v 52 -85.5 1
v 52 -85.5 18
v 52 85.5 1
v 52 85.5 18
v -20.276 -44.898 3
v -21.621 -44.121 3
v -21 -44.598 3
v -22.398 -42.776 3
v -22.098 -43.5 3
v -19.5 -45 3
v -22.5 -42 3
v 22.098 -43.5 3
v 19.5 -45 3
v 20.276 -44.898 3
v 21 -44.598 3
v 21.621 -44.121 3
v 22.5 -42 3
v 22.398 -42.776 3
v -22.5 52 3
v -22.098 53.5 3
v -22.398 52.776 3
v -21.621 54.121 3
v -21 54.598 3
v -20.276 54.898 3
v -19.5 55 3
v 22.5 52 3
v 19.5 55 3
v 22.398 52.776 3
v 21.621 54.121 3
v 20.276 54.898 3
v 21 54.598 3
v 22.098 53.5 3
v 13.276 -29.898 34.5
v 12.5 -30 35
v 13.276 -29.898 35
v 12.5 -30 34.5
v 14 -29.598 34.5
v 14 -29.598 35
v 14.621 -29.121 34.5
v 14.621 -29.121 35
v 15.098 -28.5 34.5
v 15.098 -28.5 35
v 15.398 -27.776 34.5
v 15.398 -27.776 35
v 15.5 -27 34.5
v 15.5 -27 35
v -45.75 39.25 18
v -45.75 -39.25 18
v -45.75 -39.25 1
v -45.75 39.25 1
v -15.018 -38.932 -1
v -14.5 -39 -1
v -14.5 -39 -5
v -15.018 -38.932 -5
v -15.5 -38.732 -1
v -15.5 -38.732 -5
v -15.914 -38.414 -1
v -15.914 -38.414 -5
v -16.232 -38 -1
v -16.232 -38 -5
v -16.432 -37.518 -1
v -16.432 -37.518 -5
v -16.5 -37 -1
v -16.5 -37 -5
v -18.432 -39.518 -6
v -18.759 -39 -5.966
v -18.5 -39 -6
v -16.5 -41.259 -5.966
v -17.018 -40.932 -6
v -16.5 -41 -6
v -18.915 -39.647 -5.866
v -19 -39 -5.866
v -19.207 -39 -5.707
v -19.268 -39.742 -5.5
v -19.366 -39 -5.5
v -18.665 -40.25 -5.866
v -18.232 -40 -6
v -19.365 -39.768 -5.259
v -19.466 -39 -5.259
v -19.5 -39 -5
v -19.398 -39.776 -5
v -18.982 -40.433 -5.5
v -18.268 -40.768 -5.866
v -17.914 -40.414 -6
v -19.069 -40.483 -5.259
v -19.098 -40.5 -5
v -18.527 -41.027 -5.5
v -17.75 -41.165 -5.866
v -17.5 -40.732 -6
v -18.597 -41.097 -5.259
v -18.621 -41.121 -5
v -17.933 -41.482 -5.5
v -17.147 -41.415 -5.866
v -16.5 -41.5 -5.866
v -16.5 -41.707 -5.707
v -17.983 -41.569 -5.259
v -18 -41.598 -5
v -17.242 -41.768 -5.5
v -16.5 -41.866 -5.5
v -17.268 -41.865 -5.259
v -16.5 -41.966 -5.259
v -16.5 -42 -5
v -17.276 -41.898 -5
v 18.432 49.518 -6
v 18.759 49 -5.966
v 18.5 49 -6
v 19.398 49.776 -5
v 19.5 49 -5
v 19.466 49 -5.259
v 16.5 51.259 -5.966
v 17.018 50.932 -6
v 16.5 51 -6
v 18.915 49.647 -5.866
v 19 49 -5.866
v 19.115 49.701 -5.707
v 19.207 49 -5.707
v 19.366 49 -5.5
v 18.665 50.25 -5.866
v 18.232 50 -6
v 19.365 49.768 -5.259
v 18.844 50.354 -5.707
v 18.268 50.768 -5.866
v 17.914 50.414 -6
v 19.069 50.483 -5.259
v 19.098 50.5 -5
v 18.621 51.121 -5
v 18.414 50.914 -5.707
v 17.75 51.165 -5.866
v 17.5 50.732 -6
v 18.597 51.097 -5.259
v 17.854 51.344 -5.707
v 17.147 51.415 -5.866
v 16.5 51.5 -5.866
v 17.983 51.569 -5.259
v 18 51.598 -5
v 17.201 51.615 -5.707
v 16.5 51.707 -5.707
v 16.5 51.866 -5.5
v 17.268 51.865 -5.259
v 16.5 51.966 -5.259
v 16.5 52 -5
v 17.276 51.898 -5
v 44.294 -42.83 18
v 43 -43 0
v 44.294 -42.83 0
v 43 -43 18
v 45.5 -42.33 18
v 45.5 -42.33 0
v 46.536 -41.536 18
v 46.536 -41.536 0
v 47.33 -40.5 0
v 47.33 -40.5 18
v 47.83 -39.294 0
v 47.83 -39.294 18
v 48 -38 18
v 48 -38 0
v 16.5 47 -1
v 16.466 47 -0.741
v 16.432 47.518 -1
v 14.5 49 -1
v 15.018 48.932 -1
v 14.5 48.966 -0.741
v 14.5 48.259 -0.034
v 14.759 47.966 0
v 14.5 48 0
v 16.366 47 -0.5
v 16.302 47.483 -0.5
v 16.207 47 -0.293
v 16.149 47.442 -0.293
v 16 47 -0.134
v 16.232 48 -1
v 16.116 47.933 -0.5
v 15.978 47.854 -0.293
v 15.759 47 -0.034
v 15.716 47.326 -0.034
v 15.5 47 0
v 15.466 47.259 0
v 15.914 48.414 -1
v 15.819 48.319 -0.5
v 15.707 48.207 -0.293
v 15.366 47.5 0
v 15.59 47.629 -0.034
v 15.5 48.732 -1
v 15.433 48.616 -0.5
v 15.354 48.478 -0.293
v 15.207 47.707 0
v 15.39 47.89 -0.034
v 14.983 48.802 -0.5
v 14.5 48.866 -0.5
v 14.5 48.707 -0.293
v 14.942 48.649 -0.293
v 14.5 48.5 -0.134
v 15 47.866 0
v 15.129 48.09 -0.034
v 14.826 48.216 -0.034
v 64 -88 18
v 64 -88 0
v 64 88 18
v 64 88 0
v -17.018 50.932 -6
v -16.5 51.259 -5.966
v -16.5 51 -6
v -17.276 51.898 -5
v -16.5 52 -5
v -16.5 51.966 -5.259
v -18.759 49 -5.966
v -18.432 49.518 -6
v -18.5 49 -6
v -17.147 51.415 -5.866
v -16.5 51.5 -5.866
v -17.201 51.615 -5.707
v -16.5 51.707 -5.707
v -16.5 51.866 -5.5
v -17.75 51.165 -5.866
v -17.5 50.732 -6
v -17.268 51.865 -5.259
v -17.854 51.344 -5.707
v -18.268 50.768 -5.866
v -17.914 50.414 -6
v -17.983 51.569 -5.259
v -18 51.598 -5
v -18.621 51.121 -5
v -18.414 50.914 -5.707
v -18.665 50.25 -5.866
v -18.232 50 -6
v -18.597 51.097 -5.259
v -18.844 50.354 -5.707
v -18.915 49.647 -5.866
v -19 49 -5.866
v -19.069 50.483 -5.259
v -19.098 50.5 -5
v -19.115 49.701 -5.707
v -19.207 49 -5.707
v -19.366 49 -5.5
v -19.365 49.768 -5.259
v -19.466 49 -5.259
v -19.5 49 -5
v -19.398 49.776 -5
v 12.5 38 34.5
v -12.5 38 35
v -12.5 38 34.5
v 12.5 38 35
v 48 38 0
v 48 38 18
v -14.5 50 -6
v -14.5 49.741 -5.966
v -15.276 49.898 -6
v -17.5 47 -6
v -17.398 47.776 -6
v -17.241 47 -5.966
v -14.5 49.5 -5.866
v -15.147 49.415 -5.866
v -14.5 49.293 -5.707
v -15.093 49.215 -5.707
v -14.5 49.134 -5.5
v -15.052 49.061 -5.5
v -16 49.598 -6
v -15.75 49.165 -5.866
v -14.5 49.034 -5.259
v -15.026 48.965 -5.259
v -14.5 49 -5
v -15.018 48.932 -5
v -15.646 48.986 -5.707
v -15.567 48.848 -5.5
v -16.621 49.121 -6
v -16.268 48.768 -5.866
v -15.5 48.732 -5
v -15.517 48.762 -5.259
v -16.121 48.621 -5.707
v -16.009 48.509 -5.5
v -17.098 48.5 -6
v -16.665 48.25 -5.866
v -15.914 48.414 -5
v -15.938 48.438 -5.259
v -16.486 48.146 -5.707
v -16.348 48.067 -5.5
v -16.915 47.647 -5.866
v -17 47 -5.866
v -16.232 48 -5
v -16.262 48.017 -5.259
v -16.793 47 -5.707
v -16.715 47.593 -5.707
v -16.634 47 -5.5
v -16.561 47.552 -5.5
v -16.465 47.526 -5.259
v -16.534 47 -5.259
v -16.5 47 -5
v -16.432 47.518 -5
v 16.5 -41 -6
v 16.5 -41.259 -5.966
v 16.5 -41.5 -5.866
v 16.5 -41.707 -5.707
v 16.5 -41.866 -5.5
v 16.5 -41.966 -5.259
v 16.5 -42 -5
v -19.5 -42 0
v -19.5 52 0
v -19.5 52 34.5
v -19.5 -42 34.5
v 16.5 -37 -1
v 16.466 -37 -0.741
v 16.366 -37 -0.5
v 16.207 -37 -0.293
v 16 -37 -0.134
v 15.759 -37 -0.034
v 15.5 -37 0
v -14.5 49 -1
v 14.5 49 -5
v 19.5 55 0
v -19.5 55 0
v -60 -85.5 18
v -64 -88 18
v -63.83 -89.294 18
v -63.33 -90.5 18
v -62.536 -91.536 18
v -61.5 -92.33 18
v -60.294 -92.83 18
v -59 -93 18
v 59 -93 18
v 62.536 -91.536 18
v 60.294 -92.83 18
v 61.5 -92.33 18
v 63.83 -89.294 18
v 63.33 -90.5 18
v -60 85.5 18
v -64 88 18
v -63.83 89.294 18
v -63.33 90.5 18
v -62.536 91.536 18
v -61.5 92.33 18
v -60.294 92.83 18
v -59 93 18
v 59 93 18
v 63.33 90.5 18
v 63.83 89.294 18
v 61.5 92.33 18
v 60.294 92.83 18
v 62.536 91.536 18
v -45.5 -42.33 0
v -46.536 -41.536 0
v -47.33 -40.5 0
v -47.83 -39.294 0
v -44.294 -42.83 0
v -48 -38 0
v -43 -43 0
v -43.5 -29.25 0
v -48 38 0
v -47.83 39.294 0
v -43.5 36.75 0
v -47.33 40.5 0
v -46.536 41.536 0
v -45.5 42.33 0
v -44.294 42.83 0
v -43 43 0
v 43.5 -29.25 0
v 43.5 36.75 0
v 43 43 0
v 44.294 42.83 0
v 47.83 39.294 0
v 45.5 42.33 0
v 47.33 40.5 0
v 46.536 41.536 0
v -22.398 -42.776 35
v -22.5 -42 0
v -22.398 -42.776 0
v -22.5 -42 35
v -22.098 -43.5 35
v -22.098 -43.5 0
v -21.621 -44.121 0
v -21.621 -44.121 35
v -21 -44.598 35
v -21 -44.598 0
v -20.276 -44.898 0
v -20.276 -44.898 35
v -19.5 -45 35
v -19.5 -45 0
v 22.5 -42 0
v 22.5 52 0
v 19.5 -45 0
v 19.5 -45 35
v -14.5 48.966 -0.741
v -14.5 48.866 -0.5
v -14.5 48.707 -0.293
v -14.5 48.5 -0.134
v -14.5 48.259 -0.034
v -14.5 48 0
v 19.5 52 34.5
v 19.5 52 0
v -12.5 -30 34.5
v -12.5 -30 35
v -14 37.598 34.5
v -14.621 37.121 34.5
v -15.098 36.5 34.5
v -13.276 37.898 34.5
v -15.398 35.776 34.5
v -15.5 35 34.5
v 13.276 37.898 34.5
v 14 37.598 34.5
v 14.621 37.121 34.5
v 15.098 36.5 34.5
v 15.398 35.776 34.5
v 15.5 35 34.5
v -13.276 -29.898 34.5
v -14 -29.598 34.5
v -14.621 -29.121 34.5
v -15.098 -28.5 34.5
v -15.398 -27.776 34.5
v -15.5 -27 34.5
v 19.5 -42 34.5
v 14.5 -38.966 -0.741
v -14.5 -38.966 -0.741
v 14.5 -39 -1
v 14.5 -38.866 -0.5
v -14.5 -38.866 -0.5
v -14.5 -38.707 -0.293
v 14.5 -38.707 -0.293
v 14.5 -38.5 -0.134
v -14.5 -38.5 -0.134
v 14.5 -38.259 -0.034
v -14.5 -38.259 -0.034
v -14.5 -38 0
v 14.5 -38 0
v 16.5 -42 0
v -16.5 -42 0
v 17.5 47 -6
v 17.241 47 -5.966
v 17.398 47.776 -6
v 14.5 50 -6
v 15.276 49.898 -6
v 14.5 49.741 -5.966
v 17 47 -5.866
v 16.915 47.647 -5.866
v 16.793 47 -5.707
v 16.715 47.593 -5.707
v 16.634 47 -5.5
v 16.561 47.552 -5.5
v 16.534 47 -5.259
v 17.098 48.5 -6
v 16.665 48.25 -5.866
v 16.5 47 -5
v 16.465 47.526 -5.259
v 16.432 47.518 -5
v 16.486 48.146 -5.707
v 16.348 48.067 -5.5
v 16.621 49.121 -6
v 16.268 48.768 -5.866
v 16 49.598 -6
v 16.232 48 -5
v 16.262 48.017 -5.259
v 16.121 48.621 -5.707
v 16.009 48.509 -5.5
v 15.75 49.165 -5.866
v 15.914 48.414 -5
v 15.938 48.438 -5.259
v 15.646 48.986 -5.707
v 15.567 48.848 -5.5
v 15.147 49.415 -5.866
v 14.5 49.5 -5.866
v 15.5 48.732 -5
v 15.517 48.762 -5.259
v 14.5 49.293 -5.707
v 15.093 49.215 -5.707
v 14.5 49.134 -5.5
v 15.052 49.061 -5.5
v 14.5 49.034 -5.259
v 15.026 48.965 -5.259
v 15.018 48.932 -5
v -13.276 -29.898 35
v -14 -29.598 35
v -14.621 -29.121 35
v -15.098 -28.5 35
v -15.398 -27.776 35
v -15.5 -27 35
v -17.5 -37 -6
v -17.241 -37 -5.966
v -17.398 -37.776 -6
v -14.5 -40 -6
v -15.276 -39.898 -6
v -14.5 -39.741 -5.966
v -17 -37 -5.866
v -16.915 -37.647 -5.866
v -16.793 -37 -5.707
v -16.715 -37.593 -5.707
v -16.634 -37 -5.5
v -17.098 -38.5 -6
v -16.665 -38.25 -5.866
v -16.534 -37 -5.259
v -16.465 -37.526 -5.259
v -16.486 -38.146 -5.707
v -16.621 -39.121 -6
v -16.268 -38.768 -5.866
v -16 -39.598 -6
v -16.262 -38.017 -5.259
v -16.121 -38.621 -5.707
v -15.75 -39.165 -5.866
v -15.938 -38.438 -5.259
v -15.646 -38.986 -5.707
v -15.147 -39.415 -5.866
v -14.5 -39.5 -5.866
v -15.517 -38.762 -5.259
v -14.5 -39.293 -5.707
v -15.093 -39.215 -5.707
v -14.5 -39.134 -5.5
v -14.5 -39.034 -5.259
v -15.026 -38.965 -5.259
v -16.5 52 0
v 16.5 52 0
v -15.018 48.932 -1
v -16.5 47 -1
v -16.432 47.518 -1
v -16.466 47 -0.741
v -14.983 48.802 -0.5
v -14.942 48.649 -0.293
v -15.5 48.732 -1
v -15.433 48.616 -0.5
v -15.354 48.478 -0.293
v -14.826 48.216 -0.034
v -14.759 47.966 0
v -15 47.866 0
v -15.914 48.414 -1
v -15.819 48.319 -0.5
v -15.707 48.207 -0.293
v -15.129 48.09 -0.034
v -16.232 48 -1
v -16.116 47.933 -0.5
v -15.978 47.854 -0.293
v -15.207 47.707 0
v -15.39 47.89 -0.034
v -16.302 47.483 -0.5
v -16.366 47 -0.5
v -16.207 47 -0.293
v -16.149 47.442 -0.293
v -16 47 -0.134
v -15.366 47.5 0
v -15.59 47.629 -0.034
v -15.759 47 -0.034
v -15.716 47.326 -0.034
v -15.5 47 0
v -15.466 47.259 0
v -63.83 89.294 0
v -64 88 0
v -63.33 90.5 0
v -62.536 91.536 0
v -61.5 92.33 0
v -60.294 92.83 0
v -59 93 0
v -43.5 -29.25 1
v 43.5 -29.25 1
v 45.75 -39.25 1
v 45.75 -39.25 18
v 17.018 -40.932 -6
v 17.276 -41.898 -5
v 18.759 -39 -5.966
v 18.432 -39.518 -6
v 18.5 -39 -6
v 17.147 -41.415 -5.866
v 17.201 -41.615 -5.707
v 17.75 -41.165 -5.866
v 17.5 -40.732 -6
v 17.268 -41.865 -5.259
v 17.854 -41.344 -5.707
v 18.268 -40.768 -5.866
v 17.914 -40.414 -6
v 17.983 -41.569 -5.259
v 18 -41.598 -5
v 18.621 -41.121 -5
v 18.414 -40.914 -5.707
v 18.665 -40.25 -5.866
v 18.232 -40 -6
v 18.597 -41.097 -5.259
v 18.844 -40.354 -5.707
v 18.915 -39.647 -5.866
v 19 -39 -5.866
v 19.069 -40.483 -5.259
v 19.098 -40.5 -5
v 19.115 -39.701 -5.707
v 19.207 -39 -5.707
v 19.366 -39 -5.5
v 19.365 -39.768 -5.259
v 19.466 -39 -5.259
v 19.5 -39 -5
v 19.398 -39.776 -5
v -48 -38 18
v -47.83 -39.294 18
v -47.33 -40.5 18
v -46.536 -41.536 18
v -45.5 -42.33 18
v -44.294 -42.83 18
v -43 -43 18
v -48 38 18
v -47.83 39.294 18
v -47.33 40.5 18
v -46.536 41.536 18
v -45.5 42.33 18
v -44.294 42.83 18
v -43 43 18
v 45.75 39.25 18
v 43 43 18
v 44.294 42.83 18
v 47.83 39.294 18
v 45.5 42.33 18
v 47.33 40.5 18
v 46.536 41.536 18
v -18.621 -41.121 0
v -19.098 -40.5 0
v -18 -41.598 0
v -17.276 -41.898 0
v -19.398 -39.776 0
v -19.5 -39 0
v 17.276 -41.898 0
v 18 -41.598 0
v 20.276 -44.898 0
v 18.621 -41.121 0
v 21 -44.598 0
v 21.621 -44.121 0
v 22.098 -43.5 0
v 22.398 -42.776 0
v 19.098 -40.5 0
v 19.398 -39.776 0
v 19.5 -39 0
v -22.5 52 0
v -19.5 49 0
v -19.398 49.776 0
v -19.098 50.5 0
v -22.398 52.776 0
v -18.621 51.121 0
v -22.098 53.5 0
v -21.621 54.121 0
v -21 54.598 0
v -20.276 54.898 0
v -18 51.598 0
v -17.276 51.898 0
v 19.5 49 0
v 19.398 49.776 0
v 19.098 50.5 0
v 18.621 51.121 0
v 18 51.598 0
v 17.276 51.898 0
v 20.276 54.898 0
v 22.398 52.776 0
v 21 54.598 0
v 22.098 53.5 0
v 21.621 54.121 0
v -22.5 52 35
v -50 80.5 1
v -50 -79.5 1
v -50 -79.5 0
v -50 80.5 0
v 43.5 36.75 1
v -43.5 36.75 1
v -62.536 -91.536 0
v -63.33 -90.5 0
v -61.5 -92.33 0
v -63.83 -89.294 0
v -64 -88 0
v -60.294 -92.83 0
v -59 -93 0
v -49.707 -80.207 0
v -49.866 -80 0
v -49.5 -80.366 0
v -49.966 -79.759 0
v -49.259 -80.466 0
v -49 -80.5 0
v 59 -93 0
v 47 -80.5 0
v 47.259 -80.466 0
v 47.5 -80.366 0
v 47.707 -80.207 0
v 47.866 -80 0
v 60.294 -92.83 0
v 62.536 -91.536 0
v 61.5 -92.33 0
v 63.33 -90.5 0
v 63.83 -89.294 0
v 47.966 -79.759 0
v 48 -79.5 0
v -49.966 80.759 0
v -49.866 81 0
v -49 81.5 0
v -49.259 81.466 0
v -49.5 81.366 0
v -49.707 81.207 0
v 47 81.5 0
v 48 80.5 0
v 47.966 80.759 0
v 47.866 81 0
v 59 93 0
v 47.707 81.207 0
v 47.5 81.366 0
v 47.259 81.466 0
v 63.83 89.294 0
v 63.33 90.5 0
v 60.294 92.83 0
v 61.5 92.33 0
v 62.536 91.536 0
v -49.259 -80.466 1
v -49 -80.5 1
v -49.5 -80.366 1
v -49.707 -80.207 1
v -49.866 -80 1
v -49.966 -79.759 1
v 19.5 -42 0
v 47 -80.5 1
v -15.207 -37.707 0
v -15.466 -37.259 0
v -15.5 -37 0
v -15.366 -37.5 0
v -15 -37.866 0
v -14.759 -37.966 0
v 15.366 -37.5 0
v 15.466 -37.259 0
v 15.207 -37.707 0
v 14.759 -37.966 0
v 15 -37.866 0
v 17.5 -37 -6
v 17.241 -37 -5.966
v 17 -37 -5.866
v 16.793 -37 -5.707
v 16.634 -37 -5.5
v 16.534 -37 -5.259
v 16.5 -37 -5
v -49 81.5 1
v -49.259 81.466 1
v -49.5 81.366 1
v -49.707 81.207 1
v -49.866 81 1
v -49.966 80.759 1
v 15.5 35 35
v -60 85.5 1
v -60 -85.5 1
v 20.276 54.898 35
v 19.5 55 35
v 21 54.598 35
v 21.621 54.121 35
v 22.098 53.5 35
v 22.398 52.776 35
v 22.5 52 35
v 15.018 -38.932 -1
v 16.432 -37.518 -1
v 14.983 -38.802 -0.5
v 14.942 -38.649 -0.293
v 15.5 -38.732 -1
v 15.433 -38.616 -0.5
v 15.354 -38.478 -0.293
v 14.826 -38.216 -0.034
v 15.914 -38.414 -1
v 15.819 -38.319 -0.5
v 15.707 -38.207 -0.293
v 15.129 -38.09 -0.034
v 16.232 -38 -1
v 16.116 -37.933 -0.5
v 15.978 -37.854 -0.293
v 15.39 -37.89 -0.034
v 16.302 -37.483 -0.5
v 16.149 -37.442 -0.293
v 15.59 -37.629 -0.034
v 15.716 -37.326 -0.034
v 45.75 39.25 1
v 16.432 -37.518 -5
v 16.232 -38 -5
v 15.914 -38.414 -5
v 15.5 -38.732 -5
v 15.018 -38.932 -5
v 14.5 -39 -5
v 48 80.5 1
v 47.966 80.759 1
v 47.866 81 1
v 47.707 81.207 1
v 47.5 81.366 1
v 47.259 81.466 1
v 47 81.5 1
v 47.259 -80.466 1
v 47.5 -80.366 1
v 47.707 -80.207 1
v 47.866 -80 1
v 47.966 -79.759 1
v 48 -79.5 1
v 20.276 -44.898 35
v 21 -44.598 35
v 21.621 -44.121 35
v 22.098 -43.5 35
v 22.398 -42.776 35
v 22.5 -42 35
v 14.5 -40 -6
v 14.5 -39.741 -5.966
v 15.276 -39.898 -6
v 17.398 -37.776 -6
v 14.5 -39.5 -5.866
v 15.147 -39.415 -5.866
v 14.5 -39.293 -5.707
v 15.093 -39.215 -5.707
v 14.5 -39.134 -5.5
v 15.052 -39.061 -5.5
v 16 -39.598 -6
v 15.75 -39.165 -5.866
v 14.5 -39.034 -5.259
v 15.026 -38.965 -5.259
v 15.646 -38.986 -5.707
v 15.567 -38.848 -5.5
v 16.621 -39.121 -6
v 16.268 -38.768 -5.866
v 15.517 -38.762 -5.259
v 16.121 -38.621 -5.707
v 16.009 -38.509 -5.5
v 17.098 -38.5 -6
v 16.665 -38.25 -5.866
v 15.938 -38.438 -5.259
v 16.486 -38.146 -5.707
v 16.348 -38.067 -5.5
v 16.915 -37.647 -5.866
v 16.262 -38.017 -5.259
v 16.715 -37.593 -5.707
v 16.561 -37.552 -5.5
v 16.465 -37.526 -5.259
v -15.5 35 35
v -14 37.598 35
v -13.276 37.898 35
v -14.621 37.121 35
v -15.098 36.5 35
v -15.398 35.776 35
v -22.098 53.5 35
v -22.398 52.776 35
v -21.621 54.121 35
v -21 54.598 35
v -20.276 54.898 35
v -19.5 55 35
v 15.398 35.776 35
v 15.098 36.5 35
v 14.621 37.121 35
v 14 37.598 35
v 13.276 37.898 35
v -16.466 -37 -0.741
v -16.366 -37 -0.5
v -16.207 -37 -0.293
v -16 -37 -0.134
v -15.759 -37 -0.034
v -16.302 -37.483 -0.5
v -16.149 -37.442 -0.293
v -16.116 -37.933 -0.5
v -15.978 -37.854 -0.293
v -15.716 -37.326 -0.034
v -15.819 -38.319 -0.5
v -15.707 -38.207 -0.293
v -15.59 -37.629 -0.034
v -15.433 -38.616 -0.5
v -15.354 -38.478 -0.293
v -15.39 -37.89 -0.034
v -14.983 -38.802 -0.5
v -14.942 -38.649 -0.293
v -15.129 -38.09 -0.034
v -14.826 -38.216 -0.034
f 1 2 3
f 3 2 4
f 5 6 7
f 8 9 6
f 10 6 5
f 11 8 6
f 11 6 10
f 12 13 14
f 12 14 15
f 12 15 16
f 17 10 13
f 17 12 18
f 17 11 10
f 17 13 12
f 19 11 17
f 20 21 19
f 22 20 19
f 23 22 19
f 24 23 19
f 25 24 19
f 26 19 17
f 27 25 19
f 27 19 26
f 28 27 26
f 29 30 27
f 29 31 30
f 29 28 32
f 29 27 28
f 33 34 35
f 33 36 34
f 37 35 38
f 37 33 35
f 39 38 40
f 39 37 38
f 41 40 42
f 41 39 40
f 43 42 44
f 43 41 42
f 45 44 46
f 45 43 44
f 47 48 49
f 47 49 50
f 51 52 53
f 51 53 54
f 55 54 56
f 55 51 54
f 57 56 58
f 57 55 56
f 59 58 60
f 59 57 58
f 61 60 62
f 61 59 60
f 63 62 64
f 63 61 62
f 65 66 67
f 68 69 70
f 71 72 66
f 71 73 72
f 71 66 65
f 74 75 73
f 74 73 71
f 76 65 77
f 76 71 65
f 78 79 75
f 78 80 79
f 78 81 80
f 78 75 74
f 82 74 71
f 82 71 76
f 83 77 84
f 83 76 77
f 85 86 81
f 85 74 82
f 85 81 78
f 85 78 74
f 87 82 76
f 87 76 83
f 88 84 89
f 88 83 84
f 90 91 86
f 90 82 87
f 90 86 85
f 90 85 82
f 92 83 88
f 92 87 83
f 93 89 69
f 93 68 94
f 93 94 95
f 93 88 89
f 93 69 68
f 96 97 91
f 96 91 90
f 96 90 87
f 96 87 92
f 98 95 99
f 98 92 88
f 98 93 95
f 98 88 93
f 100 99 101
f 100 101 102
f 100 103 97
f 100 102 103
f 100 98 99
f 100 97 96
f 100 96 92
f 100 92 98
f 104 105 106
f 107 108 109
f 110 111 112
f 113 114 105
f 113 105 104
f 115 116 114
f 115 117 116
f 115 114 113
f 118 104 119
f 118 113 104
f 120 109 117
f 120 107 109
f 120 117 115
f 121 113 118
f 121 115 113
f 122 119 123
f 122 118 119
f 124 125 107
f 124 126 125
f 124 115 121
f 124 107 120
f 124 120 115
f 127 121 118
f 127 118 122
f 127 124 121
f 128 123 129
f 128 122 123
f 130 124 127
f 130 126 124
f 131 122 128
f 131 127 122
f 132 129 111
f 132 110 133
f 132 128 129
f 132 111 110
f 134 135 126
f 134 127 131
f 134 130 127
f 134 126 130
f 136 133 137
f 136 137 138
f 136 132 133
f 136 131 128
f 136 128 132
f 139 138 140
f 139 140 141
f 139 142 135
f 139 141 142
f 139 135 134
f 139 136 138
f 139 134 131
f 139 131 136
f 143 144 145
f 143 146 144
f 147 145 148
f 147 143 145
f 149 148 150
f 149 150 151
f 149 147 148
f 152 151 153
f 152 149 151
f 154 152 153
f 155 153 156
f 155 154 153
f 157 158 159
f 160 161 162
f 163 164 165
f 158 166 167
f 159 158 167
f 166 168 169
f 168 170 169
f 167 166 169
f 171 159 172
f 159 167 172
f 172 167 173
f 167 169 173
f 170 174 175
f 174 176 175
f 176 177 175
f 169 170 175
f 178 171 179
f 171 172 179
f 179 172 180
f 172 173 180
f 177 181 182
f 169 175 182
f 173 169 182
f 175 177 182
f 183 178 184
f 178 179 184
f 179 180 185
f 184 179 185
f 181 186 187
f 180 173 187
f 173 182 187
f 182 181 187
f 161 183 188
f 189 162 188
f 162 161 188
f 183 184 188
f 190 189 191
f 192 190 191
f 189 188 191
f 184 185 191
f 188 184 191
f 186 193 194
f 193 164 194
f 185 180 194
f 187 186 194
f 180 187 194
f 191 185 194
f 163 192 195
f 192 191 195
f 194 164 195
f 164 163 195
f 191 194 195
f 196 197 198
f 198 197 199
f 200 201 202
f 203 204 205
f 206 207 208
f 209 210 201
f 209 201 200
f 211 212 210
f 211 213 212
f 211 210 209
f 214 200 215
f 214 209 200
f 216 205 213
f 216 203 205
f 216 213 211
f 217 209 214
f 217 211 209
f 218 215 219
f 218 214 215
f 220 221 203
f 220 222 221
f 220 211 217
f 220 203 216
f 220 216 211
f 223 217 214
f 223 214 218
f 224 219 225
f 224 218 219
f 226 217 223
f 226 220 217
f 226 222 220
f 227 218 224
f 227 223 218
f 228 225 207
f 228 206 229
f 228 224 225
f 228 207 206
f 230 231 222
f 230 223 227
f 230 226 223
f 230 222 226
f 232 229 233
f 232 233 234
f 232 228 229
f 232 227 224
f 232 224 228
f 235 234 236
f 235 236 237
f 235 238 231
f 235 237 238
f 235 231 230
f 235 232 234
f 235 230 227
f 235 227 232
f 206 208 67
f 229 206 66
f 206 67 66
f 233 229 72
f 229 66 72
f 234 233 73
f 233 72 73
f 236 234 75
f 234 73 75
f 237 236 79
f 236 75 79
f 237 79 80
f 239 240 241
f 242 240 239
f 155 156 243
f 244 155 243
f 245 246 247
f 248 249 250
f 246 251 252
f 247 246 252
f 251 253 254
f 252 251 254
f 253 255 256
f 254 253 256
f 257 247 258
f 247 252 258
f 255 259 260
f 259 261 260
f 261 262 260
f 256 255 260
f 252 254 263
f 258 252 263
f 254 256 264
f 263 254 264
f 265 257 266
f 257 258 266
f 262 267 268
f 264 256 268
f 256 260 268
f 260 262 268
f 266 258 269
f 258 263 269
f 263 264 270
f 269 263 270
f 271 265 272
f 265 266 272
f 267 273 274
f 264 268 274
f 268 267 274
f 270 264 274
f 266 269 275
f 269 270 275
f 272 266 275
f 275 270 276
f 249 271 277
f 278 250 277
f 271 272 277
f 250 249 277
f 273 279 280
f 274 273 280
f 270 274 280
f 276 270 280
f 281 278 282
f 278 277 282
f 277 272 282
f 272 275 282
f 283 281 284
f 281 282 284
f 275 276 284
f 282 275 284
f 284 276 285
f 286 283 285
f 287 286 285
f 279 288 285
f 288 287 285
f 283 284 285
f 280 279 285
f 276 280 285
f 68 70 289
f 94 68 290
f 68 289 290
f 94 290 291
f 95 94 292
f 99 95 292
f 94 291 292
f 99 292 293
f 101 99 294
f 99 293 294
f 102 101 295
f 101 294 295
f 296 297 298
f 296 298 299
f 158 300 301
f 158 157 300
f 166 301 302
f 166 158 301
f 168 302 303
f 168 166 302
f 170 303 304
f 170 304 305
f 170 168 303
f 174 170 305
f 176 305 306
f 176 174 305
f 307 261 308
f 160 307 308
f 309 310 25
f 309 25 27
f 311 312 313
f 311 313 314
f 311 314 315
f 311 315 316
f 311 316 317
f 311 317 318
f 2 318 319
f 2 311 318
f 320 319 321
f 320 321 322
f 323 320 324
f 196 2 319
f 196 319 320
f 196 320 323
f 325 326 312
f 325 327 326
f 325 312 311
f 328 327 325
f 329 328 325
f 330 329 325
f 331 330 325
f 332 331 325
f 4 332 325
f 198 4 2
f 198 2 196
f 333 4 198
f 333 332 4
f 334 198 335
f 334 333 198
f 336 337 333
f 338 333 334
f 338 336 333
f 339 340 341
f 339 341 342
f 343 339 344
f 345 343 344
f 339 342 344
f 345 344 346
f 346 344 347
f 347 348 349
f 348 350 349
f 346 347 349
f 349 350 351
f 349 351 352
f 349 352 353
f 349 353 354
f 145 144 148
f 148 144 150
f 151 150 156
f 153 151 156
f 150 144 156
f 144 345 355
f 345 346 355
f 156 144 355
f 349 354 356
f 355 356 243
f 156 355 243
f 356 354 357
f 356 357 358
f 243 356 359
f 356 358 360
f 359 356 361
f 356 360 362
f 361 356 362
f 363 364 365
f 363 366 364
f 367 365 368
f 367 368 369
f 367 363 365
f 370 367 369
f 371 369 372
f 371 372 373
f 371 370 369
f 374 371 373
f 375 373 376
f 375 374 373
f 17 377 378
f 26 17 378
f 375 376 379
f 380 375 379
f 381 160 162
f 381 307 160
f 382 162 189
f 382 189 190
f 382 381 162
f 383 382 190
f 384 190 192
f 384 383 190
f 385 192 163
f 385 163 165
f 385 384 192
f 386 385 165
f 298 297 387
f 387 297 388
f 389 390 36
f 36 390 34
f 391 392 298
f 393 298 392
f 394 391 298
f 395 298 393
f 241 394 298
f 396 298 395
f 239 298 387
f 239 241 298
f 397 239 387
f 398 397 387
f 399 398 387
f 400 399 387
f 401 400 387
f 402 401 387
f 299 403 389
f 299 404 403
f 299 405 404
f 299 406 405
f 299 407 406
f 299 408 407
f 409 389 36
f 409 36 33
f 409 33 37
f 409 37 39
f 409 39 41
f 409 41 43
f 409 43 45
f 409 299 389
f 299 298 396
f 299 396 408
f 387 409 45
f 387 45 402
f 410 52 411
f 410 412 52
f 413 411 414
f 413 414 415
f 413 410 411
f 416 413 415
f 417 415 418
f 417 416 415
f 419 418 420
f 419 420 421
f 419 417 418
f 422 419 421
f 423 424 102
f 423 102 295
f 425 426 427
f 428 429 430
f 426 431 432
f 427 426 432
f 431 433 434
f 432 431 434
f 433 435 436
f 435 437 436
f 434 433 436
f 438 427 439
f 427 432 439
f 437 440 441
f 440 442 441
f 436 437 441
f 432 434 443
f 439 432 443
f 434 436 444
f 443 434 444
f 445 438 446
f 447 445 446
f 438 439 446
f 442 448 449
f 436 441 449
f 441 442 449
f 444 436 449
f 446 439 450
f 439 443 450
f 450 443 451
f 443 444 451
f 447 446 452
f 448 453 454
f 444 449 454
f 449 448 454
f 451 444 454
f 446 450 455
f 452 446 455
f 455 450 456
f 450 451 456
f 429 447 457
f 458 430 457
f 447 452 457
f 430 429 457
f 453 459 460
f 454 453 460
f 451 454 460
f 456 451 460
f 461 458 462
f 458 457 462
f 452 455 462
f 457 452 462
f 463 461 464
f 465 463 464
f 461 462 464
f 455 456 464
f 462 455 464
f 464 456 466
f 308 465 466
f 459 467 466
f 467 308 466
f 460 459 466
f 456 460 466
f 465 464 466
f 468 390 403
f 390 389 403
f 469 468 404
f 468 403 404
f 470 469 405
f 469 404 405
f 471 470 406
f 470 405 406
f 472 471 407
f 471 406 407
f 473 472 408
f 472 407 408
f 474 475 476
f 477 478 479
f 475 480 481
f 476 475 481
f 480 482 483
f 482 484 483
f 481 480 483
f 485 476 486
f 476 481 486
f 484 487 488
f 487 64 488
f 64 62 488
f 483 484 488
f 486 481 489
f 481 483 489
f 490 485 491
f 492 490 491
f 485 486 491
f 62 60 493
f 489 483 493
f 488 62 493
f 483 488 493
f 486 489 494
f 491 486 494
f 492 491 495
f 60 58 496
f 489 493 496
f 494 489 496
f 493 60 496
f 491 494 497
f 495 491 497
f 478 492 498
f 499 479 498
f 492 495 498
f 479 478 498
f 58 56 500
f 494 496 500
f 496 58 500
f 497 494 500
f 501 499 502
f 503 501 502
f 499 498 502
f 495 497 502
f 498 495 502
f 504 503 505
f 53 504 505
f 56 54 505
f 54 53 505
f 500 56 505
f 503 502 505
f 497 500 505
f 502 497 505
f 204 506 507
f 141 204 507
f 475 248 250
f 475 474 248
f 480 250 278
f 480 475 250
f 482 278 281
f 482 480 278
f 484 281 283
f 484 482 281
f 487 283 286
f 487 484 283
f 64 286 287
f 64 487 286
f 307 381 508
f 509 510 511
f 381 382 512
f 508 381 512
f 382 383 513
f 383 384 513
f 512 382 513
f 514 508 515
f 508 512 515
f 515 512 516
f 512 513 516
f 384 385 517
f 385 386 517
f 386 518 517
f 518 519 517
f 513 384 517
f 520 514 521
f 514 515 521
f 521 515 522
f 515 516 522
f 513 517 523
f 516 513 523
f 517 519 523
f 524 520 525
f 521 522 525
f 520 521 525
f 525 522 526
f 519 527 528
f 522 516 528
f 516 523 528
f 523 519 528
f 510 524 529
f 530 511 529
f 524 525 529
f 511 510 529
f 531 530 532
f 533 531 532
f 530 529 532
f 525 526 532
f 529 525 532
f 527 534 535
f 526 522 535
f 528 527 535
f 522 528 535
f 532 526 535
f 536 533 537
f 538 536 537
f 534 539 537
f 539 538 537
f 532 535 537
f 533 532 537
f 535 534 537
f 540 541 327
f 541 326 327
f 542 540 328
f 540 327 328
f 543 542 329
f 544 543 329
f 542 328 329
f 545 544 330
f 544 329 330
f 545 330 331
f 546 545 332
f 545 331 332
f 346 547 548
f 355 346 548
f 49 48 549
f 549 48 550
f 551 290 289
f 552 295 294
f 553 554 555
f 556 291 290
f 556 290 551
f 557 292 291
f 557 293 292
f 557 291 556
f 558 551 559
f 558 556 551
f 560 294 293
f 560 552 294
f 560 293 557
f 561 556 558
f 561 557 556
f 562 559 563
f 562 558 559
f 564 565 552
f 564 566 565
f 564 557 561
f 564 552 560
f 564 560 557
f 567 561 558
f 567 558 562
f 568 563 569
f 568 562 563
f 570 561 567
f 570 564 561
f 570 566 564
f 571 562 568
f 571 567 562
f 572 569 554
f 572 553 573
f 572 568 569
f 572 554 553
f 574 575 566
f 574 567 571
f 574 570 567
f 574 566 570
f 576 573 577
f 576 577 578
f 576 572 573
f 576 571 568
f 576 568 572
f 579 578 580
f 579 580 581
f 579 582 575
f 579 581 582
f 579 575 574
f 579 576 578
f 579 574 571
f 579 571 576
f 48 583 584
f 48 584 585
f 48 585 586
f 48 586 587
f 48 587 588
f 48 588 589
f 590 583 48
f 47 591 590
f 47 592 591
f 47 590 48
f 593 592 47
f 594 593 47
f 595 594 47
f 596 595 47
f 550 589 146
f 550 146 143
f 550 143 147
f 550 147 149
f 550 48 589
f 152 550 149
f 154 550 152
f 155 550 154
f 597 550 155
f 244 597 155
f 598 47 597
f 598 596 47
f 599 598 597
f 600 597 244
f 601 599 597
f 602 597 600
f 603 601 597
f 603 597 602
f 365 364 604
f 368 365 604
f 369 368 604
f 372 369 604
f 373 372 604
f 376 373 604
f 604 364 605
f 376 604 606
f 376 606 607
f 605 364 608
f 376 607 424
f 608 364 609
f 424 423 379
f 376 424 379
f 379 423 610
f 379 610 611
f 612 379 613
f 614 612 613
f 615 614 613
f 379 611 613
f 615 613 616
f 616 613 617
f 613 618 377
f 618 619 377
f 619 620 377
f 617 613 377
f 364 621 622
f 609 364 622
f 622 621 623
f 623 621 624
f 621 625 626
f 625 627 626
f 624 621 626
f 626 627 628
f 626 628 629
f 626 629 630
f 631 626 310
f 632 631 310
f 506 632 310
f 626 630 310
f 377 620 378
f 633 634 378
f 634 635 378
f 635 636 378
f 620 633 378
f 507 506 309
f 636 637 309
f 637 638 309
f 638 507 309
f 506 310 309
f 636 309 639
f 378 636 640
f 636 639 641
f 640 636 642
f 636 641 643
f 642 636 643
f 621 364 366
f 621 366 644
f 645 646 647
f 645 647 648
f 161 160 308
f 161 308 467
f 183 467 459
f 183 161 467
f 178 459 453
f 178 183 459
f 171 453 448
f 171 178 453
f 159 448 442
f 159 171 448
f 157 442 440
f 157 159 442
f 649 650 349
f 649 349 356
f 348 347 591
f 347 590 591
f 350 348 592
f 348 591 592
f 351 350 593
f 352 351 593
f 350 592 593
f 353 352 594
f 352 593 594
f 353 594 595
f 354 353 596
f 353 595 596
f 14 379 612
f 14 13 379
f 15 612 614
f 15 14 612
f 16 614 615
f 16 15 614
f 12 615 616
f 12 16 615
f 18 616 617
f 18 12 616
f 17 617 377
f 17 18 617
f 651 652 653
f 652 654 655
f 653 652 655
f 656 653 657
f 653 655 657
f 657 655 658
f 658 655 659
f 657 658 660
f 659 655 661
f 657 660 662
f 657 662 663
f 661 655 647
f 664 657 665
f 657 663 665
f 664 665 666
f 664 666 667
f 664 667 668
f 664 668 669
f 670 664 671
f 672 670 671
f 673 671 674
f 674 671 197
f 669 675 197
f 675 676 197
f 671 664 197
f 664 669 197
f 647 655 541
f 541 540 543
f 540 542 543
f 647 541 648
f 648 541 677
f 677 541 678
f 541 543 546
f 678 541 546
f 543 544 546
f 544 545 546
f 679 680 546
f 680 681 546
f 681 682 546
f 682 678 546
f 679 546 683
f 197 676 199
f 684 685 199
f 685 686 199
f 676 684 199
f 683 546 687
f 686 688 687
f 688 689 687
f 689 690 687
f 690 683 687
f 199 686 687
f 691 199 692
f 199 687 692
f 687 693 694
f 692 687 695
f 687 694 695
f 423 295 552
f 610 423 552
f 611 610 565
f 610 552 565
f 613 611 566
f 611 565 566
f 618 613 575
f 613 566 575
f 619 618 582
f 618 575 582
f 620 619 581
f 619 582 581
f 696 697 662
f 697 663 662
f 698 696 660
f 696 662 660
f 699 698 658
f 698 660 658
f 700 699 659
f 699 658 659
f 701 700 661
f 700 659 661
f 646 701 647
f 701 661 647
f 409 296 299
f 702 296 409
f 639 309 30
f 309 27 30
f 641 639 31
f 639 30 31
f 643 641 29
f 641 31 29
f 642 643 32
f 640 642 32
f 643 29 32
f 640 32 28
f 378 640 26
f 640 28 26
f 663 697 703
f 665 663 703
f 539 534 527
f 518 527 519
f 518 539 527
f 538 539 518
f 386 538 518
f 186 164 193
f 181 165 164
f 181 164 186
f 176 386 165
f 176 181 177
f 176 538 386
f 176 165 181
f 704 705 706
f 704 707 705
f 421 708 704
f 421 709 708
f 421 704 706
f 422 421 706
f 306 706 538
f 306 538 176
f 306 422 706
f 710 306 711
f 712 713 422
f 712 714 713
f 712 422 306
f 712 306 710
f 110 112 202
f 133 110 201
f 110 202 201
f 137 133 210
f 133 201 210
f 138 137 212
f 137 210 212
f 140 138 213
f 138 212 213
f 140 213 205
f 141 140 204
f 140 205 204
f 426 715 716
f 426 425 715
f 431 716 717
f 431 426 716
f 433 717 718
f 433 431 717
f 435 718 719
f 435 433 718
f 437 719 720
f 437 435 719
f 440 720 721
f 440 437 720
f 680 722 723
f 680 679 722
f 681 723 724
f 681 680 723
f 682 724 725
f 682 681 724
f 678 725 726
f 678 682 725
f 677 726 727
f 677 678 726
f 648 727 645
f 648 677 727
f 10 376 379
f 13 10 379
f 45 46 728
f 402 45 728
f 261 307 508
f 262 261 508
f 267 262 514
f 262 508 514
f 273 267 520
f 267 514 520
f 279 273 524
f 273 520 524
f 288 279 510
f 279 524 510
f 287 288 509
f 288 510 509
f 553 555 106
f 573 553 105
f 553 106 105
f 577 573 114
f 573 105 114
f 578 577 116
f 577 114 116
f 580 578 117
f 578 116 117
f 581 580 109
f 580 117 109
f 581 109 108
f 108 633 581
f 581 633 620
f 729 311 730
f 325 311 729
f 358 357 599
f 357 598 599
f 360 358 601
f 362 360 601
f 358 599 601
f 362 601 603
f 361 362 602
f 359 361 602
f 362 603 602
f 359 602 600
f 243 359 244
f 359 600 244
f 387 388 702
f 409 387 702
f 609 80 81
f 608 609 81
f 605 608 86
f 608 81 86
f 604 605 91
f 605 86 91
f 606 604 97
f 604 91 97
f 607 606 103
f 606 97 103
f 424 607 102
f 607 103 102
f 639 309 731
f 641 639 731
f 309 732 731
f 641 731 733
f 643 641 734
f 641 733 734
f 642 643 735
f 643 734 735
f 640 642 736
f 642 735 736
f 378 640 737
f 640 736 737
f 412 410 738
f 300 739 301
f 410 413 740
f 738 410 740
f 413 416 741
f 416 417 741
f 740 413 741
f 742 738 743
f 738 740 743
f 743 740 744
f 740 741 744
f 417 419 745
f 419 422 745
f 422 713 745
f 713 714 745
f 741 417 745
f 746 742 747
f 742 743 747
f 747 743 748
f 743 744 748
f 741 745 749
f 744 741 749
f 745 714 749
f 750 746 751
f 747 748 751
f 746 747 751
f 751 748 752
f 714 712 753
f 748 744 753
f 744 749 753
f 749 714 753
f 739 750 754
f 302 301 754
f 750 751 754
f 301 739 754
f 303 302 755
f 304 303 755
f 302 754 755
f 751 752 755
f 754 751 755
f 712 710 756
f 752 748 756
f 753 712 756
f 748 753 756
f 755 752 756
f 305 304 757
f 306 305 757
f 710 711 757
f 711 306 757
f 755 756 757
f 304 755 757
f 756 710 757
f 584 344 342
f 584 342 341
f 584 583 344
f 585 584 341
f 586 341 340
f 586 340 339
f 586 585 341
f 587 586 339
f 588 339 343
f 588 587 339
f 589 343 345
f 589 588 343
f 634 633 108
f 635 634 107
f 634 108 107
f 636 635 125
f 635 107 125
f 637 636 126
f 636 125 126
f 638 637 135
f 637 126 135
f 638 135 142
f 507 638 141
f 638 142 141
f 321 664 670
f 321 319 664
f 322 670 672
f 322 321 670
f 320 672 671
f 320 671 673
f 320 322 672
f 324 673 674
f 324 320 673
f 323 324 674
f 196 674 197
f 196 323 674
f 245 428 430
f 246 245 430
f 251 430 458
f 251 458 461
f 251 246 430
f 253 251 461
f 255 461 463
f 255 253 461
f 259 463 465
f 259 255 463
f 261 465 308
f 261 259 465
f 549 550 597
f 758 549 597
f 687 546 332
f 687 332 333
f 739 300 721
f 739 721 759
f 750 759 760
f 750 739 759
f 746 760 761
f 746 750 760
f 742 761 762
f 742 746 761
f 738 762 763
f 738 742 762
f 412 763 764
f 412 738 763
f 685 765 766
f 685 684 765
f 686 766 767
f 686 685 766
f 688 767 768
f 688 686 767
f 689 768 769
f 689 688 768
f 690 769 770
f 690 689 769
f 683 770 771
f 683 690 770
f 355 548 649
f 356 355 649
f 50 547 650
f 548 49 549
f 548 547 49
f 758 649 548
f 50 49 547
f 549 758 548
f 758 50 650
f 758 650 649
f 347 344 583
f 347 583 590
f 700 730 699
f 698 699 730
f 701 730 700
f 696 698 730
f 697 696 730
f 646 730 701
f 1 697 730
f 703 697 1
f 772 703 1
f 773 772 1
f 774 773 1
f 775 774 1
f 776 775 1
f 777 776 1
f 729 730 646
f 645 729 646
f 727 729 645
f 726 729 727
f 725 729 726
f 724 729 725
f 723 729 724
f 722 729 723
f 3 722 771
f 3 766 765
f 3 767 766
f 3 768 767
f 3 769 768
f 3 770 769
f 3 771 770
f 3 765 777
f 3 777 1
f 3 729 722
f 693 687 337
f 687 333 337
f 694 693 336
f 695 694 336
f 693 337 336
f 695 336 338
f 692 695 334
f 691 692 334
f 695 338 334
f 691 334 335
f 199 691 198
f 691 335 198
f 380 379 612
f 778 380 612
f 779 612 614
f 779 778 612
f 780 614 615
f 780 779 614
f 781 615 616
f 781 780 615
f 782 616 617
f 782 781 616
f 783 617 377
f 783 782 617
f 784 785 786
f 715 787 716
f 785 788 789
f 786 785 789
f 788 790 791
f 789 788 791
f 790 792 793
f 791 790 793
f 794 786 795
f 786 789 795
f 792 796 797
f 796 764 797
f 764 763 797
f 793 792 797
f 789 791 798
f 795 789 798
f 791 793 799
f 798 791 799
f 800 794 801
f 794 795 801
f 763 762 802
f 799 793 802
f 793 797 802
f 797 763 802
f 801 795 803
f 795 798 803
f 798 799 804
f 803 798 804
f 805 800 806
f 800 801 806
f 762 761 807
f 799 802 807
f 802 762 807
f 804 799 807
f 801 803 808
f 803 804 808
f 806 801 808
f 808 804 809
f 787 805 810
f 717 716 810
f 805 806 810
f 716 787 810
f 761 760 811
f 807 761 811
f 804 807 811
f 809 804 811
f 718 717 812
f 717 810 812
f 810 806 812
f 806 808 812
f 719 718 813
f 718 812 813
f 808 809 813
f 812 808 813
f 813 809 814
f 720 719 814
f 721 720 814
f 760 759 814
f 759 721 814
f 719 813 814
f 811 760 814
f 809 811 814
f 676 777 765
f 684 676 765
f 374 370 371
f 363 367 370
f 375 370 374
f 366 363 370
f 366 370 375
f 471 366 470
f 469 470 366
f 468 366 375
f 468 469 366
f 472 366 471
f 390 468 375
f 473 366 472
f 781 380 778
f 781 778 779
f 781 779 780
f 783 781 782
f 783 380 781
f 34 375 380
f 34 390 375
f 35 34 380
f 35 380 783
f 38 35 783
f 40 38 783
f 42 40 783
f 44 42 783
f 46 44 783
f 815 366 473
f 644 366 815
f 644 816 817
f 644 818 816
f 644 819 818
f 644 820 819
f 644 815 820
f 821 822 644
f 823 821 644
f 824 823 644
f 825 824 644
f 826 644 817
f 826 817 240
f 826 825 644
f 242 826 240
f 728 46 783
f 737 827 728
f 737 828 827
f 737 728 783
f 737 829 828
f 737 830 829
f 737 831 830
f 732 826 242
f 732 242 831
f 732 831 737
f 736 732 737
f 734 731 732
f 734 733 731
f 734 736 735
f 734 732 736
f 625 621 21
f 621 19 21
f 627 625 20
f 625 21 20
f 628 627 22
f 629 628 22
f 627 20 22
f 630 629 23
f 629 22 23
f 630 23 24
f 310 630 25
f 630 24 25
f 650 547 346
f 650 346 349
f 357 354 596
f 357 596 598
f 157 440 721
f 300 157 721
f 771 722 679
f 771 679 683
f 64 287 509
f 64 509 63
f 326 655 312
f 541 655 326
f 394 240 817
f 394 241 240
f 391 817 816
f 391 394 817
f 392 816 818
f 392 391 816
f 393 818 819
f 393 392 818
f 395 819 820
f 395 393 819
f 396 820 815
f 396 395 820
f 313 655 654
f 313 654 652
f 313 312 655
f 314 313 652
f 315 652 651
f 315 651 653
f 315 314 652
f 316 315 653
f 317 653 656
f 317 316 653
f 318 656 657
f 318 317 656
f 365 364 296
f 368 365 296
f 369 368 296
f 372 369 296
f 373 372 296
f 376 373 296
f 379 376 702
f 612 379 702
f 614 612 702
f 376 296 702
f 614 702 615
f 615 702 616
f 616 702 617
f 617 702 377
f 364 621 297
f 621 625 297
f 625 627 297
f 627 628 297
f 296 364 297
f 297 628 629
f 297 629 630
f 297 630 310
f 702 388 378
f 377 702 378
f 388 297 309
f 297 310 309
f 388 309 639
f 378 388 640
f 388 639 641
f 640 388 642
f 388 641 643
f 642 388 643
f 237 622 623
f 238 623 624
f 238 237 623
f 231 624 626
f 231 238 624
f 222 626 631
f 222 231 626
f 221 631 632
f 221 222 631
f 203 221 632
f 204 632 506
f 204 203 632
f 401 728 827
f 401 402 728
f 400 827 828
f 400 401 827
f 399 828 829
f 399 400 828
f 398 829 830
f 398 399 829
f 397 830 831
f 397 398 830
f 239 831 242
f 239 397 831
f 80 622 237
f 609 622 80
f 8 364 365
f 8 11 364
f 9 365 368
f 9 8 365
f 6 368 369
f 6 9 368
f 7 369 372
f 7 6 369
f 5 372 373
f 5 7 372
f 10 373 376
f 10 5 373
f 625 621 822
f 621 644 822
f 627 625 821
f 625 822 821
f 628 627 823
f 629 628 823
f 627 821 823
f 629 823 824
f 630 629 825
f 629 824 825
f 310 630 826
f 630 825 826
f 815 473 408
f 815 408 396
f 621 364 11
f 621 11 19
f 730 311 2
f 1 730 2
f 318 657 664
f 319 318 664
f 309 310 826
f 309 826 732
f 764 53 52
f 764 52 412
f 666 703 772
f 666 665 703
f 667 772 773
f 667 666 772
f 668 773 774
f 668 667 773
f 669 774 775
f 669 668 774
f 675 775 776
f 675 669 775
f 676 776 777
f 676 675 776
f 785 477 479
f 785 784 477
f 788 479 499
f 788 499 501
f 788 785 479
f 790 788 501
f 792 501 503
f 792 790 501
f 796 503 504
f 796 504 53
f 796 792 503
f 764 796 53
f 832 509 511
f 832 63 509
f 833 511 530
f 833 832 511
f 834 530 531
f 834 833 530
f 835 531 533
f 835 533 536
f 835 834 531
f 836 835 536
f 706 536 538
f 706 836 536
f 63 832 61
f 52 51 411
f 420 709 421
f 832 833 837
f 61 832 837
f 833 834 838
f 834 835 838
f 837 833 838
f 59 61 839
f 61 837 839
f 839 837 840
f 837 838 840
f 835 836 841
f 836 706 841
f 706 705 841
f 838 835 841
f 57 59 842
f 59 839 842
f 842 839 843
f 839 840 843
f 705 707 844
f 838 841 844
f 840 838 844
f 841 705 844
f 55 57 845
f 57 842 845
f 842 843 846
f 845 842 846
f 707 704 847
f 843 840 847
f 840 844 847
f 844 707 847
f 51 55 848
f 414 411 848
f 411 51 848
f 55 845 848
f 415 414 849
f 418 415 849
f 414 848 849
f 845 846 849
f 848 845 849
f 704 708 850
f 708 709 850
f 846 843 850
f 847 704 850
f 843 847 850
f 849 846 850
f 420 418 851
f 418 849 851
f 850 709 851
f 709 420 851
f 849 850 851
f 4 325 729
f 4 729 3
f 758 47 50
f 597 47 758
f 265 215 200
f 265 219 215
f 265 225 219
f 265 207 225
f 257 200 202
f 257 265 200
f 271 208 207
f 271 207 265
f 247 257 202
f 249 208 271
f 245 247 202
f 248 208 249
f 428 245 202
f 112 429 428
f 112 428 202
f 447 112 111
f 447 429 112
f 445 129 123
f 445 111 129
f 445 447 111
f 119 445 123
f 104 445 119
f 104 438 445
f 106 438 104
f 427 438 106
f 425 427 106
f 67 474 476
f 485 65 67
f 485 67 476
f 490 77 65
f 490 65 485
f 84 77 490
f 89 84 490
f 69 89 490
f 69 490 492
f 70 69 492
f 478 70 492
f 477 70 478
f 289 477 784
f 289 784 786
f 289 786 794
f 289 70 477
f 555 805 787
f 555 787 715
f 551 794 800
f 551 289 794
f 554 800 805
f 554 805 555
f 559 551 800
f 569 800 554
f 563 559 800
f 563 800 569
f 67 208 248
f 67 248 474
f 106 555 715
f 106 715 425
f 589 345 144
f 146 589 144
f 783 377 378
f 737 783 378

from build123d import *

# Parameters (mm, degrees)
SKETCH_W        = 45
SKETCH_H        = 100
PAD_DEPTH       = 35
SKETCH001_W     = 31
SKETCH001_H     = 68
POCKET_DEPTH    = 35.001
SKETCH002_W     = 39
SKETCH002_H     = 94
POCKET001_DEPTH = 34.5
FILLET_R        = 3
SKETCH003_W     = 45
SKETCH003_H     = 100
PAD001_DEPTH    = 3
SKETCH005_W     = 39
SKETCH005_H     = 94
PAD002_DEPTH    = 6
FILLET001_R     = 3
SKETCH006_W     = 33
SKETCH006_H     = 88
POCKET002_DEPTH = 6
FILLET002_R     = 2
FILLET003_R     = 1
SKETCH007_W     = 96
SKETCH007_H     = 86
PAD003_DEPTH    = 18
SKETCH008_W     = 91.5
SKETCH008_H     = 78.5
POCKET003_DEPTH = 17
SKETCH009_W     = 87
SKETCH009_H     = 66
POCKET004_DEPTH = 1.001
FILLET004_R     = 5
SKETCH010_W     = 128
SKETCH010_H     = 186
PAD004_DEPTH    = 18
SKETCH011_W     = 112
SKETCH011_H     = 171
POCKET005_DEPTH = 17
SKETCH012_W     = 98
SKETCH012_H     = 162
POCKET006_DEPTH = 1.001
FILLET005_R     = 5
FILLET006_R     = 1


with BuildPart() as body:
    # Sketch → Pad (new body)
    with BuildSketch(Plane.XY):
        with Locations((0, 5)):
            Rectangle(SKETCH_W, SKETCH_H)
    extrude(amount=PAD_DEPTH)

    # Sketch001 (on Face6 of Pad) → Pocket (cut, through all)
    with BuildSketch(Plane.XY.offset(35)):
        with Locations((0, 4)):
            Rectangle(SKETCH001_W, SKETCH001_H)
    extrude(amount=-POCKET_DEPTH, mode=Mode.SUBTRACT)

    # Sketch002 (on Face4 of Pocket) → Pocket001 (cut)
    with BuildSketch(Plane(origin=(0, 0, 0), x_dir=(1, 0, 0), z_dir=(0, 0, -1))):
        with Locations((0, -5)):
            Rectangle(SKETCH002_W, SKETCH002_H)
    extrude(amount=-POCKET001_DEPTH, mode=Mode.SUBTRACT)

    # Fillet
    fillet_edges = [body.edges().sort_by_distance(p)[0] for p in [
        (15.5, 38, 34.75),
        (15.5, -30, 34.75),
        (-15.5, -30, 34.75),
        (-15.5, 38, 34.75),
        (22.5, 55, 17.5),
        (22.5, -45, 17.5),
        (-22.5, -45, 17.5),
        (-22.5, 55, 17.5),
    ]]
    fillet(fillet_edges, radius=FILLET_R)


with BuildPart() as lid:
    # Sketch003 → Pad001 (new body)
    with BuildSketch(Plane.XY):
        with Locations((0, 5)):
            Rectangle(SKETCH003_W, SKETCH003_H)
    extrude(amount=PAD001_DEPTH)

    # Sketch005 (on Face5 of Pad001) → Pad002 (join)
    with BuildSketch(Plane(origin=(0, 0, 0), x_dir=(1, 0, 0), z_dir=(0, 0, -1))):
        with Locations((0, -5)):
            Rectangle(SKETCH005_W, SKETCH005_H)
    extrude(amount=PAD002_DEPTH)

    # Fillet001
    fillet001_edges = [lid.edges().sort_by_distance(p)[0] for p in [
        (22.5, -45, 1.5),
        (19.5, -42, -3),
        (22.5, 55, 1.5),
        (19.5, 52, -3),
        (-22.5, -45, 1.5),
        (-19.5, -42, -3),
        (-22.5, 55, 1.5),
        (-19.5, 52, -3),
    ]]
    fillet(fillet001_edges, radius=FILLET001_R)

    # Sketch006 (on Face19 of Fillet001) → Pocket002 (cut)
    with BuildSketch(Plane(origin=(0, 0, -6), x_dir=(1, 0, 0), z_dir=(0, 0, -1))):
        with Locations((0, -5)):
            Rectangle(SKETCH006_W, SKETCH006_H)
    extrude(amount=-POCKET002_DEPTH, mode=Mode.SUBTRACT)

    # Fillet002
    fillet002_edges = [lid.edges().sort_by_distance(p)[0] for p in [
        (16.5, 49, -3),
        (-16.5, 49, -3),
        (-16.5, -39, -3),
        (16.5, -39, -3),
    ]]
    fillet(fillet002_edges, radius=FILLET002_R)

    # Fillet003
    fillet003_edges = [lid.edges().sort_by_distance(p)[0] for p in [
        (0, -39, 0),
        (-15.914214, -38.414214, 0),
        (15.914214, -38.414214, 0),
        (-16.5, 5, 0),
        (16.5, 5, 0),
        (-15.914214, 48.414214, 0),
        (15.914214, 48.414214, 0),
        (0, 49, 0),
        (0, -39, -6),
        (-15.914214, -38.414214, -6),
        (15.914214, -38.414214, -6),
        (-16.5, 5, -6),
        (16.5, 5, -6),
        (-15.914214, 48.414214, -6),
        (15.914214, 48.414214, -6),
        (0, 49, -6),
        (0, -42, -6),
        (-18.62132, -41.12132, -6),
        (18.62132, -41.12132, -6),
        (-19.5, 5, -6),
        (19.5, 5, -6),
        (-18.62132, 51.12132, -6),
        (18.62132, 51.12132, -6),
        (0, 52, -6),
    ]]
    fillet(fillet003_edges, radius=FILLET003_R)


with BuildPart() as screen_panel:
    # Sketch007 → Pad003 (new body)
    with BuildSketch(Plane.XY):
        Rectangle(SKETCH007_W, SKETCH007_H)
    extrude(amount=PAD003_DEPTH)

    # Sketch008 (on Face6 of Pad003) → Pocket003 (cut)
    with BuildSketch(Plane.XY.offset(18)):
        Rectangle(SKETCH008_W, SKETCH008_H)
    extrude(amount=-POCKET003_DEPTH, mode=Mode.SUBTRACT)

    # Sketch009 (on Face11 of Pocket003) → Pocket004 (cut, through all)
    with BuildSketch(Plane.XY.offset(1)):
        with Locations((0, 3.75)):
            Rectangle(SKETCH009_W, SKETCH009_H)
    extrude(amount=-POCKET004_DEPTH, mode=Mode.SUBTRACT)

    # Fillet004
    fillet004_edges = [screen_panel.edges().sort_by_distance(p)[0] for p in [
        (-48, -43, 9),
        (-48, 43, 9),
        (48, 43, 9),
        (48, -43, 9),
    ]]
    fillet(fillet004_edges, radius=FILLET004_R)


with BuildPart() as body003:
    # Sketch010 → Pad004 (new body)
    with BuildSketch(Plane.XY):
        Rectangle(SKETCH010_W, SKETCH010_H)
    extrude(amount=PAD004_DEPTH)

    # Sketch011 (on Face6 of Pad004) → Pocket005 (cut)
    with BuildSketch(Plane.XY.offset(18)):
        with Locations((-4, 0)):
            Rectangle(SKETCH011_W, SKETCH011_H)
    extrude(amount=-POCKET005_DEPTH, mode=Mode.SUBTRACT)

    # Sketch012 (on Face11 of Pocket005) → Pocket006 (cut, through all)
    with BuildSketch(Plane.XY.offset(1)):
        with Locations((-1, 0.5)):
            Rectangle(SKETCH012_W, SKETCH012_H)
    extrude(amount=-POCKET006_DEPTH, mode=Mode.SUBTRACT)

    # Fillet005
    fillet005_edges = [body003.edges().sort_by_distance(p)[0] for p in [
        (-64, -93, 9),
        (-64, 93, 9),
        (64, 93, 9),
        (64, -93, 9),
    ]]
    fillet(fillet005_edges, radius=FILLET005_R)

    # Fillet006
    fillet006_edges = [body003.edges().sort_by_distance(p)[0] for p in [
        (-50, -80.5, 0.5),
        (48, -80.5, 0.5),
        (48, 81.5, 0.5),
        (-50, 81.5, 0.5),
    ]]
    fillet(fillet006_edges, radius=FILLET006_R)


solid = Compound([body.part, lid.part, screen_panel.part, body003.part])
